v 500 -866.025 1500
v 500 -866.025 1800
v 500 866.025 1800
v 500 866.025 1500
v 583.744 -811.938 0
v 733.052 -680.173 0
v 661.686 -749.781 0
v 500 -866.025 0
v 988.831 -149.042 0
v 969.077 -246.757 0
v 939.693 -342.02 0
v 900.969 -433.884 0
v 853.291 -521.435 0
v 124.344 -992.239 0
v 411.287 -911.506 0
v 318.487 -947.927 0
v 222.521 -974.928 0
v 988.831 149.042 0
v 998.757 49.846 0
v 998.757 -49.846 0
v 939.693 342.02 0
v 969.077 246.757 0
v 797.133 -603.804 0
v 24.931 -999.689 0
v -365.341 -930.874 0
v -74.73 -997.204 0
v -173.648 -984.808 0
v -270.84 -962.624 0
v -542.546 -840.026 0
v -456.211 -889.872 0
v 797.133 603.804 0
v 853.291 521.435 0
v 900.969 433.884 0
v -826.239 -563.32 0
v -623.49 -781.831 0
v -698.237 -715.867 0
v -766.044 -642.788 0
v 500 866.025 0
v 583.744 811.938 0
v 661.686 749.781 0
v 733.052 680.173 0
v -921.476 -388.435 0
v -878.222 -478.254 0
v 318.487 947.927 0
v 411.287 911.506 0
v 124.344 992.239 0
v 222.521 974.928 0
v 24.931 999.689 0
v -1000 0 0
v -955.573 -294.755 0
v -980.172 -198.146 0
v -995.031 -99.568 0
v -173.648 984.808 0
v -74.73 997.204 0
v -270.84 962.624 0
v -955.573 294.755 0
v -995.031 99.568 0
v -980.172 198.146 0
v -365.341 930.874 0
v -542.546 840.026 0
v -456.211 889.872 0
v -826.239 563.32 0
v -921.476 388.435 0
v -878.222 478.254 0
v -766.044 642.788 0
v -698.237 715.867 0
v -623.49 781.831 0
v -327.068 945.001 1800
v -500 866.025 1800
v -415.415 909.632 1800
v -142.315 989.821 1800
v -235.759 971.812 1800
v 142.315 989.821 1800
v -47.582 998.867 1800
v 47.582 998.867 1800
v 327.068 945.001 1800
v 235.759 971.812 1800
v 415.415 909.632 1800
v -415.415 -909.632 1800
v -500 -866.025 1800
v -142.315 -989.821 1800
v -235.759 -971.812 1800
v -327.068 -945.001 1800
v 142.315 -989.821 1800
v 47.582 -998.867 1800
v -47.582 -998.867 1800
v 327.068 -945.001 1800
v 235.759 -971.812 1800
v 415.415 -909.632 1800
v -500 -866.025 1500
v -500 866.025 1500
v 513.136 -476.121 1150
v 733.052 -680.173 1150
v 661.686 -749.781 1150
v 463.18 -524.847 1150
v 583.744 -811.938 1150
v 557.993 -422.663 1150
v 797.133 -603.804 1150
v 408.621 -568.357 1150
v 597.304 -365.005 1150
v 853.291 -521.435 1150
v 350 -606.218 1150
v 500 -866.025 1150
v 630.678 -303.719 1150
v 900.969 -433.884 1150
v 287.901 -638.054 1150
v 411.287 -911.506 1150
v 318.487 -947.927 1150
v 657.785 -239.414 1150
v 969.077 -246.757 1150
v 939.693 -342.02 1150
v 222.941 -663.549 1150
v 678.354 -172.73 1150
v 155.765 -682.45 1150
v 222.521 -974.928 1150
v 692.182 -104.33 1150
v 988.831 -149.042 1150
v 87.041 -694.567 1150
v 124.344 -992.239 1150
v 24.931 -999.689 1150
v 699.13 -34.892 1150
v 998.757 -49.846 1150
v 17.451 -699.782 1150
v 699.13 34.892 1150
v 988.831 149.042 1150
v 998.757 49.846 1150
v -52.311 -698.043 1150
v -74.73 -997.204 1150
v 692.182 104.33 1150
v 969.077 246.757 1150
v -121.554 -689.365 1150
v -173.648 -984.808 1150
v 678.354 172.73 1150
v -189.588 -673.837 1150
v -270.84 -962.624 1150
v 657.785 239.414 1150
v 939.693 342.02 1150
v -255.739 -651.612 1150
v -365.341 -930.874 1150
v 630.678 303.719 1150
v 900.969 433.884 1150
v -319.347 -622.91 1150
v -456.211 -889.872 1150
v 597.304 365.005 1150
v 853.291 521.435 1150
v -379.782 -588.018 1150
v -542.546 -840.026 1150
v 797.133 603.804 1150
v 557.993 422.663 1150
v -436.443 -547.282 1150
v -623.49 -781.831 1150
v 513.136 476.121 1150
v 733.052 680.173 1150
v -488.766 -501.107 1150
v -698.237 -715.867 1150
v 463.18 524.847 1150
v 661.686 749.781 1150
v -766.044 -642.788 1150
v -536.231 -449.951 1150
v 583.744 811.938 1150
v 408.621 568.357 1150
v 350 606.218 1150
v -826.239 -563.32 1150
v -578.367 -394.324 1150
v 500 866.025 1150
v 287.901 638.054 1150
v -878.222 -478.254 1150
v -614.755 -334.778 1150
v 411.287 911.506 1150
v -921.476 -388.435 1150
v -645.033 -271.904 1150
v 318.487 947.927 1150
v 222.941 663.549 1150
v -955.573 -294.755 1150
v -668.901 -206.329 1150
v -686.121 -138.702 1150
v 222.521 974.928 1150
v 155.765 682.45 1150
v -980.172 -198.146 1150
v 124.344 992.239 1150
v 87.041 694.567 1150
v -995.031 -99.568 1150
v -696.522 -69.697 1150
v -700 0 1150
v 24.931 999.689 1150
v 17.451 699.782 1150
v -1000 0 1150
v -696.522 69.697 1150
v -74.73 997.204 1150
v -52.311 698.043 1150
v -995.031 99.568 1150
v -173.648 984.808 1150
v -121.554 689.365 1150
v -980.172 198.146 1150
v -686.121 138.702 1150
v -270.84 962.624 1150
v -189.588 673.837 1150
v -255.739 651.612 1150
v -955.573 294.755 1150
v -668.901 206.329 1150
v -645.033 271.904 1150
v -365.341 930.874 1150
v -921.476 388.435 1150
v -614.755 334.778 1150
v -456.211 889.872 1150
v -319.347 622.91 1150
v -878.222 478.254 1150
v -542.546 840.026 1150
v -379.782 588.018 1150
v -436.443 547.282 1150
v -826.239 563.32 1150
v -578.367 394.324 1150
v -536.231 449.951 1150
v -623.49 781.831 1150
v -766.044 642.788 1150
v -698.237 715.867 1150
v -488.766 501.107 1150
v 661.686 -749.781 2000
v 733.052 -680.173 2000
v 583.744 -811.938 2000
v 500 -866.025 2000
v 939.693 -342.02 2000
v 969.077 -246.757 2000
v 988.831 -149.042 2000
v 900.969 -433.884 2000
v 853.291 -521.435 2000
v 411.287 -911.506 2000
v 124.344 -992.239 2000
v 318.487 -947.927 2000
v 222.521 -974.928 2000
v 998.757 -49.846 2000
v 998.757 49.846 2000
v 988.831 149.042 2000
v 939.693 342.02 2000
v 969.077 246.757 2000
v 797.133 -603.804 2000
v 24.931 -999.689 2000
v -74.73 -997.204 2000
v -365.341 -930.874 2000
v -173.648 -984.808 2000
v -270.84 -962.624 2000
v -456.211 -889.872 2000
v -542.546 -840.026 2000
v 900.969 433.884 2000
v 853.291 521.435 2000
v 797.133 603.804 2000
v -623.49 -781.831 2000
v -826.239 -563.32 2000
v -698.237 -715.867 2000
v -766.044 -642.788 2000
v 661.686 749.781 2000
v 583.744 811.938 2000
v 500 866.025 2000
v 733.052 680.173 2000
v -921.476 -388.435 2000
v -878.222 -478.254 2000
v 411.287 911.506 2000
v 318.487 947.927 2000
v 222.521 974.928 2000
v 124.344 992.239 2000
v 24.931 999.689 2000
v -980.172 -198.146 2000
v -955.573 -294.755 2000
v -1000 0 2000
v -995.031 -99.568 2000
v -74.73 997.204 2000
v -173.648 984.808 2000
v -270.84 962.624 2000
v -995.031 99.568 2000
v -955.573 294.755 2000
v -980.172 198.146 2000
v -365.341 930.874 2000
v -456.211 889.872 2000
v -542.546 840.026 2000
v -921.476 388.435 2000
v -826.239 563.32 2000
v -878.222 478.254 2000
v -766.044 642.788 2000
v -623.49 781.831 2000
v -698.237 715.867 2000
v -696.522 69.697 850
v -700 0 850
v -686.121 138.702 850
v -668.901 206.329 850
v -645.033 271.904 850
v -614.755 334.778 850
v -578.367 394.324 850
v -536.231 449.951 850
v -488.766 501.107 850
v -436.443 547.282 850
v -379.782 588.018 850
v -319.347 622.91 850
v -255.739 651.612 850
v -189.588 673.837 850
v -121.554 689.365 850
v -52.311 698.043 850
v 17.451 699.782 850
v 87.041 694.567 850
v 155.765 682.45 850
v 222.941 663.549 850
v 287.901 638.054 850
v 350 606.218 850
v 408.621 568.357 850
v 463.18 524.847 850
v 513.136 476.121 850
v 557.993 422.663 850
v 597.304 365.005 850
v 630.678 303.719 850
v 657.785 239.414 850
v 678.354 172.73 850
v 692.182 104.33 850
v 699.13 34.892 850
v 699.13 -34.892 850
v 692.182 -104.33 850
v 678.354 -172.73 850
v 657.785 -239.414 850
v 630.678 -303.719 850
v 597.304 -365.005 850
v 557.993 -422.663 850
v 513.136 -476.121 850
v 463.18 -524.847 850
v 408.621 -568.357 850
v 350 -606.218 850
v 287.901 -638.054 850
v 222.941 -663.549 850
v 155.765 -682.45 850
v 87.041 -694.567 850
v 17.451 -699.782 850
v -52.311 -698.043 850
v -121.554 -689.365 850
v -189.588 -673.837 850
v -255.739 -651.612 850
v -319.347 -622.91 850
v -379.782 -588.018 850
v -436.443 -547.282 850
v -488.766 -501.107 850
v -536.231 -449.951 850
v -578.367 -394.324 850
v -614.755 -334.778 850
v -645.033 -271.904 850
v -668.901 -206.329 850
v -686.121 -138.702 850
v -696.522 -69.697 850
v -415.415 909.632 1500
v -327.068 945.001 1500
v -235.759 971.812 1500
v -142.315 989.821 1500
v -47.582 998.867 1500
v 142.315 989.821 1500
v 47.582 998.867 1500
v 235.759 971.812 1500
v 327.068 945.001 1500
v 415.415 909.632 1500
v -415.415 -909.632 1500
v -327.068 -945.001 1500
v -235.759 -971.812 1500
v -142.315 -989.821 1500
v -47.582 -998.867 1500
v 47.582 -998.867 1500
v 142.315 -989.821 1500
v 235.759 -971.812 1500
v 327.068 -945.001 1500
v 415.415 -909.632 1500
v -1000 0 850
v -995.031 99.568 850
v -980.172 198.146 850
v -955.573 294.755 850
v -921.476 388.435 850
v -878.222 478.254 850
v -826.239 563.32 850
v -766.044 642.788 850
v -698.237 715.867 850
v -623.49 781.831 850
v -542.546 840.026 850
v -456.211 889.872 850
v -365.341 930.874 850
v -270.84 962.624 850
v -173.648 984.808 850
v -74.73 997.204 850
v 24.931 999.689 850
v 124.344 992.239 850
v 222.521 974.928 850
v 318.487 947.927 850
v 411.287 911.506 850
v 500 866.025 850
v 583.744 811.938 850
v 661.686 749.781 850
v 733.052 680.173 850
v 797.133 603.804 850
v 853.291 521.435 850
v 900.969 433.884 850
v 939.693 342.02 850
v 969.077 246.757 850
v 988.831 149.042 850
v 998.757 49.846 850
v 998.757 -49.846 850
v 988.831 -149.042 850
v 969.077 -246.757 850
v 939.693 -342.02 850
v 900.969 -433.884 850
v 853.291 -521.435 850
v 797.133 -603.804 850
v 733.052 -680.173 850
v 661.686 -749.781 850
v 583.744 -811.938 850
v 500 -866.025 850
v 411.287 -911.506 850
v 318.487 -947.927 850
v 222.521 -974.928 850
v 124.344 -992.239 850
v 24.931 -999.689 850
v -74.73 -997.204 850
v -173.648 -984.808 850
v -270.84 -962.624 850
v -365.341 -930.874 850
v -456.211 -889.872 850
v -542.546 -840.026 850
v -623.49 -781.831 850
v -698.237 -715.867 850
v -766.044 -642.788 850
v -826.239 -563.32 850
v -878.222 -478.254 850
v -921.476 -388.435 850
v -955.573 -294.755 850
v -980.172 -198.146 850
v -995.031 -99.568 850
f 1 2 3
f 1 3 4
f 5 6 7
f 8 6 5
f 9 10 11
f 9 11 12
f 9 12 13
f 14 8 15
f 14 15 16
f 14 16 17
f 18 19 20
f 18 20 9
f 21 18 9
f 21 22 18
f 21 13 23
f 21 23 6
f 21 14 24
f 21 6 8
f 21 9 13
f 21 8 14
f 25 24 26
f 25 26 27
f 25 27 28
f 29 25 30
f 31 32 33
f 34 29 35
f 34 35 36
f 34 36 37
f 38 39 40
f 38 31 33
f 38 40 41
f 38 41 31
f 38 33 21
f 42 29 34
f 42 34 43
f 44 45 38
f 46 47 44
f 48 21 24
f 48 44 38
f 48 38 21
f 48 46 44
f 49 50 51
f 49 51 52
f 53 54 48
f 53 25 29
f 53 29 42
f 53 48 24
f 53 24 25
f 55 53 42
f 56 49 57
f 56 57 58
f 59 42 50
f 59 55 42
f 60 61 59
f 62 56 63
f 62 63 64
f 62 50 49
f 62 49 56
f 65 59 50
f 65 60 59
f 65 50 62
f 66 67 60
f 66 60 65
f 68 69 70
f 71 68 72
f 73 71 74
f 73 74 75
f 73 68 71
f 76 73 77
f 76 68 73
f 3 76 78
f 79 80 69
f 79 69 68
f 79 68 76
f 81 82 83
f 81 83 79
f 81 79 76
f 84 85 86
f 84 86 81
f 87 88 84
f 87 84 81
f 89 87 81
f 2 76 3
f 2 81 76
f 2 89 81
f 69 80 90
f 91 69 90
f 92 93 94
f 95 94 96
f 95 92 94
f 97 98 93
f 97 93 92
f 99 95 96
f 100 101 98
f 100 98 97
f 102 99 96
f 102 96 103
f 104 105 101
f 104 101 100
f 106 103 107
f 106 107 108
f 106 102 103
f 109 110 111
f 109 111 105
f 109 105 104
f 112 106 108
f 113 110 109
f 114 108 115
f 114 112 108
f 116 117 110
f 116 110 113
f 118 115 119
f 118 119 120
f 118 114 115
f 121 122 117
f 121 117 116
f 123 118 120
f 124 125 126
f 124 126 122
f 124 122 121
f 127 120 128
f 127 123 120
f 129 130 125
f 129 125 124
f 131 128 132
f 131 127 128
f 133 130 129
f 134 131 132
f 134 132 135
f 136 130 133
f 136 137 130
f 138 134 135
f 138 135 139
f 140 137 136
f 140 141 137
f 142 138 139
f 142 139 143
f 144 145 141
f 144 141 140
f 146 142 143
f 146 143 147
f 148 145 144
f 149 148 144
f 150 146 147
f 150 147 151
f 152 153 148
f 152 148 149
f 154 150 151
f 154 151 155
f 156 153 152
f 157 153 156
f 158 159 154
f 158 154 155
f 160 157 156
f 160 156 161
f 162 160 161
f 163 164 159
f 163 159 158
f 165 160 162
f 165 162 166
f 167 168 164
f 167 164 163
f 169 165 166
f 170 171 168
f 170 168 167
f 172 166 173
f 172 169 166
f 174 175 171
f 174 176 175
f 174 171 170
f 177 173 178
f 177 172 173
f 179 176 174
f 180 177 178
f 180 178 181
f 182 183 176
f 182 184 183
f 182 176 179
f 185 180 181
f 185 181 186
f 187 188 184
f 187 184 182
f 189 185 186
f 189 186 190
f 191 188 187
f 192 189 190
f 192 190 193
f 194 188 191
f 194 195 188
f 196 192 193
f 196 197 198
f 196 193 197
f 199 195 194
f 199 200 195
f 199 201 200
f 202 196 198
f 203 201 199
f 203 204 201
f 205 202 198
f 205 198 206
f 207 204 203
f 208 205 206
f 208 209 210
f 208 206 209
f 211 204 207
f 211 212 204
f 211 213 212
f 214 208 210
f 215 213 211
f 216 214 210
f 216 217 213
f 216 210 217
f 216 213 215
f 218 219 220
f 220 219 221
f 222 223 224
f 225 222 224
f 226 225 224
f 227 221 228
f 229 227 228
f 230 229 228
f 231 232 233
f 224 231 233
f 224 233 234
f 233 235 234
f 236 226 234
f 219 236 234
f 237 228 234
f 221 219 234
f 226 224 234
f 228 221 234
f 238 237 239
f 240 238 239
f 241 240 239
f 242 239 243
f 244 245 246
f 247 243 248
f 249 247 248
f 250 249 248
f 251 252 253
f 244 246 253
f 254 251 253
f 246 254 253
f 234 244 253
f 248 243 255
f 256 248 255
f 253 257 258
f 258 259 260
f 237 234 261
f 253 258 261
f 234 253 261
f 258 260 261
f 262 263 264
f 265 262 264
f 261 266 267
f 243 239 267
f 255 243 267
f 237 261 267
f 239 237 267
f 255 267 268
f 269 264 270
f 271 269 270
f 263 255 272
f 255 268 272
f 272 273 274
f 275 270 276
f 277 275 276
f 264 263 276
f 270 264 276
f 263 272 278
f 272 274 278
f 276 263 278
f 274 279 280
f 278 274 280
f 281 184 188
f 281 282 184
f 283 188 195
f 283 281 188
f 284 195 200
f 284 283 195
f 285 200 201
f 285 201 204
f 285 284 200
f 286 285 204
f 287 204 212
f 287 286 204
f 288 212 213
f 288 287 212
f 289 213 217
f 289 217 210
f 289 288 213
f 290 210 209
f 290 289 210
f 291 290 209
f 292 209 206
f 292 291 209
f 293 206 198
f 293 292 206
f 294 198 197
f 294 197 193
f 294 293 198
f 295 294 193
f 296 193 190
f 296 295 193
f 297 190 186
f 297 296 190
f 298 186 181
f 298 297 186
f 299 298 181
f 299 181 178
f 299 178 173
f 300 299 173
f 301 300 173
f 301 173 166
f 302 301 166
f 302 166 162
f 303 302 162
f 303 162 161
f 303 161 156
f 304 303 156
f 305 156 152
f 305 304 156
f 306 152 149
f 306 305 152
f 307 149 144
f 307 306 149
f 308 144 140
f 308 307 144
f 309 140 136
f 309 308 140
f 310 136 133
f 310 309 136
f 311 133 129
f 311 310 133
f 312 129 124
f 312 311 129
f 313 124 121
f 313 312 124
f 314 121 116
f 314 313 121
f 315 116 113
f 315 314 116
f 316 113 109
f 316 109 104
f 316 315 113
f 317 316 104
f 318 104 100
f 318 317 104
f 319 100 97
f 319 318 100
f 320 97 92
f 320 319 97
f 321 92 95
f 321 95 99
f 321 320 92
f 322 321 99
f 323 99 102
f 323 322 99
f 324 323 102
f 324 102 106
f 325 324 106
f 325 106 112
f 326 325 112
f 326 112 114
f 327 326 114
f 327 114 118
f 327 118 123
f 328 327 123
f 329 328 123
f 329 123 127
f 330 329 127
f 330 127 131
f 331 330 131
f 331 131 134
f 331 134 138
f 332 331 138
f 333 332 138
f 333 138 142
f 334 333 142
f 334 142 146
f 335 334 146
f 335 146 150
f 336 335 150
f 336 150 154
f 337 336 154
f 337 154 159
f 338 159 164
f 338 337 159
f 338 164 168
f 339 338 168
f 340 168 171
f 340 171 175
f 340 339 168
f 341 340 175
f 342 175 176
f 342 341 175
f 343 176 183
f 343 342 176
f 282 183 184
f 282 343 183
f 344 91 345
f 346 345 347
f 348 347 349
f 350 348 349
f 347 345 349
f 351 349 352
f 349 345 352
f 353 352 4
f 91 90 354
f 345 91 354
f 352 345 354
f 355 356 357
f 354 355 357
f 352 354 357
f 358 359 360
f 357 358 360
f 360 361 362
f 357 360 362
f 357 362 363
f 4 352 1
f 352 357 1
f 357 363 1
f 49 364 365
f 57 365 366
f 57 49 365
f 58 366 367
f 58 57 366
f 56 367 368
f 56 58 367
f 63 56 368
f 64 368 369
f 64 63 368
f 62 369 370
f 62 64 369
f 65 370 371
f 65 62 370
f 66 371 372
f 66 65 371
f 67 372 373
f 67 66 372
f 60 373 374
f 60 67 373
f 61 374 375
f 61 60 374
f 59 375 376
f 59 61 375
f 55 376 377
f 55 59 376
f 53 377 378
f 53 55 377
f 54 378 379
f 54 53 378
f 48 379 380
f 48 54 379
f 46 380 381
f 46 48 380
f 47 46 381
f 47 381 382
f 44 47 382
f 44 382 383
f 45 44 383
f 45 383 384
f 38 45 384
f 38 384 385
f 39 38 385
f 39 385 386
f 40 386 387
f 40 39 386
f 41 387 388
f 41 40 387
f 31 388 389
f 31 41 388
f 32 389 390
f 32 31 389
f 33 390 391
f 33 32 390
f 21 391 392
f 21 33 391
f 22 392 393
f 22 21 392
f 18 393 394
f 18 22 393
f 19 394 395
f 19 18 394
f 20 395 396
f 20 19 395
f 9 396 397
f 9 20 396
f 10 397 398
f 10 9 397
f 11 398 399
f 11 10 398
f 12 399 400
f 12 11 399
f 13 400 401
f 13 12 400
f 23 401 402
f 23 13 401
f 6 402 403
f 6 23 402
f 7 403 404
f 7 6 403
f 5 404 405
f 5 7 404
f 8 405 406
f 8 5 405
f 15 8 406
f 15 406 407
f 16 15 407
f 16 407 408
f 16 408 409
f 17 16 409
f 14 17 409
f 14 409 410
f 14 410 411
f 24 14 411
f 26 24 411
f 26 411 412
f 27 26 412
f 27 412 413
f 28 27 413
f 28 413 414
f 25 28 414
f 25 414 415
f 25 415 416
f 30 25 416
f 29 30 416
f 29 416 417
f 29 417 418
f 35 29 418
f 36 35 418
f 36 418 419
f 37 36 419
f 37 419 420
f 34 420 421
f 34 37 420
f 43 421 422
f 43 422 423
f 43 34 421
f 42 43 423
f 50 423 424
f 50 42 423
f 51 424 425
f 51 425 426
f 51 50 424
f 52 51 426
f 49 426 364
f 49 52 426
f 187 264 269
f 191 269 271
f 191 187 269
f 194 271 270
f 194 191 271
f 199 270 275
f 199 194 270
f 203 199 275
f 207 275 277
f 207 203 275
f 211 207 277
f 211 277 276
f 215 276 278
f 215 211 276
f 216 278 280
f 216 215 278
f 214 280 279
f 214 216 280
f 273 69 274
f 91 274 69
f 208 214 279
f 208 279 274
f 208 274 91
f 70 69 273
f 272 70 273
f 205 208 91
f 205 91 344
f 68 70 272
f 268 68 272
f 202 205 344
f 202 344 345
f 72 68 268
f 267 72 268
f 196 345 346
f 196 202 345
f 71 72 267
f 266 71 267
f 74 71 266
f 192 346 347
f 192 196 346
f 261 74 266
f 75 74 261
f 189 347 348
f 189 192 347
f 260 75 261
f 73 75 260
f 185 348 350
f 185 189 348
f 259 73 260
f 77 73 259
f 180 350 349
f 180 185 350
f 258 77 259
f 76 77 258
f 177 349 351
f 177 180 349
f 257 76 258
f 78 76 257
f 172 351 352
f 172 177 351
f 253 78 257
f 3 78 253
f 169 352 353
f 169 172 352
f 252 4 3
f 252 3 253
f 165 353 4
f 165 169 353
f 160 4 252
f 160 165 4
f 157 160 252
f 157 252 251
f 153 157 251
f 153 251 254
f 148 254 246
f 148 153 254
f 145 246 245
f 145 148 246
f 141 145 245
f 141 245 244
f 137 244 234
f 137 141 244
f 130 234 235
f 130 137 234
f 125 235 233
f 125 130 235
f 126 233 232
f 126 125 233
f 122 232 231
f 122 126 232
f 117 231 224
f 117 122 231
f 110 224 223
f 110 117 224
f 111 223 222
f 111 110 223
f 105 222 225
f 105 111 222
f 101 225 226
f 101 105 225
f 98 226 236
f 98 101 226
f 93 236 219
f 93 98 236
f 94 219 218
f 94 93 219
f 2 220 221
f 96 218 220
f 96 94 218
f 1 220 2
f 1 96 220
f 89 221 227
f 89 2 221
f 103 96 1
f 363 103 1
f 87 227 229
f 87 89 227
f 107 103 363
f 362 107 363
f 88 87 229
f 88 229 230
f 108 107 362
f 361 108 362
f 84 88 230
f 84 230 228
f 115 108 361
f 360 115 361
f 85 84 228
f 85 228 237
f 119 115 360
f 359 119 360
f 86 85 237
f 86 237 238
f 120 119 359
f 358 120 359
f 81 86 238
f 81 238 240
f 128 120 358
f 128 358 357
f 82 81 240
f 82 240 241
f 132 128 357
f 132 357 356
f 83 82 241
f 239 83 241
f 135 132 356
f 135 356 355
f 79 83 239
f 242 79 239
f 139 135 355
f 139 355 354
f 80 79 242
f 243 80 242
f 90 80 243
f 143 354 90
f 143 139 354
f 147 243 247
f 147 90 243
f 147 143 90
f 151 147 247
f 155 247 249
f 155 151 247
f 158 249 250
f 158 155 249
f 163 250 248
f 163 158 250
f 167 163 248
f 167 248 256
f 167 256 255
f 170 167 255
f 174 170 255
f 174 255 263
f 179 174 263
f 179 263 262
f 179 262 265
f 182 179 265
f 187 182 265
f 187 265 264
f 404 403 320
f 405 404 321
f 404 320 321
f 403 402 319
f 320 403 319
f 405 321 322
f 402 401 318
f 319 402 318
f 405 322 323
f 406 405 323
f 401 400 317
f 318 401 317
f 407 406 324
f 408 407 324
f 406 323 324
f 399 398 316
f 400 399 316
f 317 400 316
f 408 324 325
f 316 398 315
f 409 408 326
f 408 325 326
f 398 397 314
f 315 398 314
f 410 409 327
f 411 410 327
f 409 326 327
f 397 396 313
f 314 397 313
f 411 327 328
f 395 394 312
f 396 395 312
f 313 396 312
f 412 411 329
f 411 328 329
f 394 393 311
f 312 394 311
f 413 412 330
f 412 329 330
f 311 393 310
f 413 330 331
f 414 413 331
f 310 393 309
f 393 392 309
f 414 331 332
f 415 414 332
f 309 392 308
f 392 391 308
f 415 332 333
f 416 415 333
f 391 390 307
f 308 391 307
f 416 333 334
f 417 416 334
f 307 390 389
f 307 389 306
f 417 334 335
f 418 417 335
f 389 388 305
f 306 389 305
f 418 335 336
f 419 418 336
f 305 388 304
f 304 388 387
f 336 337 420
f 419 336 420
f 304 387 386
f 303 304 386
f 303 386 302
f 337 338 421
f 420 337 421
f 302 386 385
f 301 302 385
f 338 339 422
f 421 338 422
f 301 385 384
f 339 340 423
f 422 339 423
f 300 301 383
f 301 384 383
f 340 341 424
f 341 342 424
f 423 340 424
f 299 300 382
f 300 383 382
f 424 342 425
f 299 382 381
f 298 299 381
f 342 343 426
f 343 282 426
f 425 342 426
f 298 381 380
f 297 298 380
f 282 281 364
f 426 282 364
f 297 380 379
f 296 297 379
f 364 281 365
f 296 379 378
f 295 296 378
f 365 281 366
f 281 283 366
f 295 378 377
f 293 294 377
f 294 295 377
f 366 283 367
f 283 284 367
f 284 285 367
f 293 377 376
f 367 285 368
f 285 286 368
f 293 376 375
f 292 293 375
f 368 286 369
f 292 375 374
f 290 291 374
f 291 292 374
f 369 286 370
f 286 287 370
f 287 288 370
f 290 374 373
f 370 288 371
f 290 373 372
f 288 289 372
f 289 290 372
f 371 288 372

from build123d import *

# Parameters (mm, degrees)
SKETCH1_W               = 1000
SKETCH1_H               = 2000
SKETCH4_W               = 1000
SKETCH4_H               = 300
CUT_EXTRUDE1_DEPTH      = 1001
CUT_EXTRUDE1_DEPTH_BACK = 1001
SKETCH5_W               = 300
SKETCH5_H               = 300


with BuildPart() as part:
    # Sketch1 → Revolve1 (revolve)
    with BuildSketch(Plane(origin=(0, 0, 0), x_dir=(1, 0, 0), z_dir=(0, 1, 0))):
        with Locations((-500, -1000)):
            Rectangle(SKETCH1_W, SKETCH1_H)
    revolve(axis=Axis((0, 0, 2000), (0, 0, -1)))

    # Sketch4 → Cut-Extrude1 (cut, two sides)
    with BuildSketch(Plane(origin=(0, 0, 0), x_dir=(1, 0, 0), z_dir=(0, 1, 0))) as cut_extrude1_sk:
        with Locations((0, -1650)):
            Rectangle(SKETCH4_W, SKETCH4_H)
    extrude(amount=CUT_EXTRUDE1_DEPTH, mode=Mode.SUBTRACT)
    extrude(cut_extrude1_sk.sketch, amount=-CUT_EXTRUDE1_DEPTH_BACK, mode=Mode.SUBTRACT)

    # Sketch5 → Cut-Revolve1 (revolve, cut)
    with BuildSketch(Plane(origin=(0, 0, 0), x_dir=(1, 0, 0), z_dir=(0, 1, 0))):
        with Locations((-850, -1000)):
            Rectangle(SKETCH5_W, SKETCH5_H)
    revolve(axis=Axis((0, 0, 2000), (0, 0, -1)), mode=Mode.SUBTRACT)


solid = part.part
